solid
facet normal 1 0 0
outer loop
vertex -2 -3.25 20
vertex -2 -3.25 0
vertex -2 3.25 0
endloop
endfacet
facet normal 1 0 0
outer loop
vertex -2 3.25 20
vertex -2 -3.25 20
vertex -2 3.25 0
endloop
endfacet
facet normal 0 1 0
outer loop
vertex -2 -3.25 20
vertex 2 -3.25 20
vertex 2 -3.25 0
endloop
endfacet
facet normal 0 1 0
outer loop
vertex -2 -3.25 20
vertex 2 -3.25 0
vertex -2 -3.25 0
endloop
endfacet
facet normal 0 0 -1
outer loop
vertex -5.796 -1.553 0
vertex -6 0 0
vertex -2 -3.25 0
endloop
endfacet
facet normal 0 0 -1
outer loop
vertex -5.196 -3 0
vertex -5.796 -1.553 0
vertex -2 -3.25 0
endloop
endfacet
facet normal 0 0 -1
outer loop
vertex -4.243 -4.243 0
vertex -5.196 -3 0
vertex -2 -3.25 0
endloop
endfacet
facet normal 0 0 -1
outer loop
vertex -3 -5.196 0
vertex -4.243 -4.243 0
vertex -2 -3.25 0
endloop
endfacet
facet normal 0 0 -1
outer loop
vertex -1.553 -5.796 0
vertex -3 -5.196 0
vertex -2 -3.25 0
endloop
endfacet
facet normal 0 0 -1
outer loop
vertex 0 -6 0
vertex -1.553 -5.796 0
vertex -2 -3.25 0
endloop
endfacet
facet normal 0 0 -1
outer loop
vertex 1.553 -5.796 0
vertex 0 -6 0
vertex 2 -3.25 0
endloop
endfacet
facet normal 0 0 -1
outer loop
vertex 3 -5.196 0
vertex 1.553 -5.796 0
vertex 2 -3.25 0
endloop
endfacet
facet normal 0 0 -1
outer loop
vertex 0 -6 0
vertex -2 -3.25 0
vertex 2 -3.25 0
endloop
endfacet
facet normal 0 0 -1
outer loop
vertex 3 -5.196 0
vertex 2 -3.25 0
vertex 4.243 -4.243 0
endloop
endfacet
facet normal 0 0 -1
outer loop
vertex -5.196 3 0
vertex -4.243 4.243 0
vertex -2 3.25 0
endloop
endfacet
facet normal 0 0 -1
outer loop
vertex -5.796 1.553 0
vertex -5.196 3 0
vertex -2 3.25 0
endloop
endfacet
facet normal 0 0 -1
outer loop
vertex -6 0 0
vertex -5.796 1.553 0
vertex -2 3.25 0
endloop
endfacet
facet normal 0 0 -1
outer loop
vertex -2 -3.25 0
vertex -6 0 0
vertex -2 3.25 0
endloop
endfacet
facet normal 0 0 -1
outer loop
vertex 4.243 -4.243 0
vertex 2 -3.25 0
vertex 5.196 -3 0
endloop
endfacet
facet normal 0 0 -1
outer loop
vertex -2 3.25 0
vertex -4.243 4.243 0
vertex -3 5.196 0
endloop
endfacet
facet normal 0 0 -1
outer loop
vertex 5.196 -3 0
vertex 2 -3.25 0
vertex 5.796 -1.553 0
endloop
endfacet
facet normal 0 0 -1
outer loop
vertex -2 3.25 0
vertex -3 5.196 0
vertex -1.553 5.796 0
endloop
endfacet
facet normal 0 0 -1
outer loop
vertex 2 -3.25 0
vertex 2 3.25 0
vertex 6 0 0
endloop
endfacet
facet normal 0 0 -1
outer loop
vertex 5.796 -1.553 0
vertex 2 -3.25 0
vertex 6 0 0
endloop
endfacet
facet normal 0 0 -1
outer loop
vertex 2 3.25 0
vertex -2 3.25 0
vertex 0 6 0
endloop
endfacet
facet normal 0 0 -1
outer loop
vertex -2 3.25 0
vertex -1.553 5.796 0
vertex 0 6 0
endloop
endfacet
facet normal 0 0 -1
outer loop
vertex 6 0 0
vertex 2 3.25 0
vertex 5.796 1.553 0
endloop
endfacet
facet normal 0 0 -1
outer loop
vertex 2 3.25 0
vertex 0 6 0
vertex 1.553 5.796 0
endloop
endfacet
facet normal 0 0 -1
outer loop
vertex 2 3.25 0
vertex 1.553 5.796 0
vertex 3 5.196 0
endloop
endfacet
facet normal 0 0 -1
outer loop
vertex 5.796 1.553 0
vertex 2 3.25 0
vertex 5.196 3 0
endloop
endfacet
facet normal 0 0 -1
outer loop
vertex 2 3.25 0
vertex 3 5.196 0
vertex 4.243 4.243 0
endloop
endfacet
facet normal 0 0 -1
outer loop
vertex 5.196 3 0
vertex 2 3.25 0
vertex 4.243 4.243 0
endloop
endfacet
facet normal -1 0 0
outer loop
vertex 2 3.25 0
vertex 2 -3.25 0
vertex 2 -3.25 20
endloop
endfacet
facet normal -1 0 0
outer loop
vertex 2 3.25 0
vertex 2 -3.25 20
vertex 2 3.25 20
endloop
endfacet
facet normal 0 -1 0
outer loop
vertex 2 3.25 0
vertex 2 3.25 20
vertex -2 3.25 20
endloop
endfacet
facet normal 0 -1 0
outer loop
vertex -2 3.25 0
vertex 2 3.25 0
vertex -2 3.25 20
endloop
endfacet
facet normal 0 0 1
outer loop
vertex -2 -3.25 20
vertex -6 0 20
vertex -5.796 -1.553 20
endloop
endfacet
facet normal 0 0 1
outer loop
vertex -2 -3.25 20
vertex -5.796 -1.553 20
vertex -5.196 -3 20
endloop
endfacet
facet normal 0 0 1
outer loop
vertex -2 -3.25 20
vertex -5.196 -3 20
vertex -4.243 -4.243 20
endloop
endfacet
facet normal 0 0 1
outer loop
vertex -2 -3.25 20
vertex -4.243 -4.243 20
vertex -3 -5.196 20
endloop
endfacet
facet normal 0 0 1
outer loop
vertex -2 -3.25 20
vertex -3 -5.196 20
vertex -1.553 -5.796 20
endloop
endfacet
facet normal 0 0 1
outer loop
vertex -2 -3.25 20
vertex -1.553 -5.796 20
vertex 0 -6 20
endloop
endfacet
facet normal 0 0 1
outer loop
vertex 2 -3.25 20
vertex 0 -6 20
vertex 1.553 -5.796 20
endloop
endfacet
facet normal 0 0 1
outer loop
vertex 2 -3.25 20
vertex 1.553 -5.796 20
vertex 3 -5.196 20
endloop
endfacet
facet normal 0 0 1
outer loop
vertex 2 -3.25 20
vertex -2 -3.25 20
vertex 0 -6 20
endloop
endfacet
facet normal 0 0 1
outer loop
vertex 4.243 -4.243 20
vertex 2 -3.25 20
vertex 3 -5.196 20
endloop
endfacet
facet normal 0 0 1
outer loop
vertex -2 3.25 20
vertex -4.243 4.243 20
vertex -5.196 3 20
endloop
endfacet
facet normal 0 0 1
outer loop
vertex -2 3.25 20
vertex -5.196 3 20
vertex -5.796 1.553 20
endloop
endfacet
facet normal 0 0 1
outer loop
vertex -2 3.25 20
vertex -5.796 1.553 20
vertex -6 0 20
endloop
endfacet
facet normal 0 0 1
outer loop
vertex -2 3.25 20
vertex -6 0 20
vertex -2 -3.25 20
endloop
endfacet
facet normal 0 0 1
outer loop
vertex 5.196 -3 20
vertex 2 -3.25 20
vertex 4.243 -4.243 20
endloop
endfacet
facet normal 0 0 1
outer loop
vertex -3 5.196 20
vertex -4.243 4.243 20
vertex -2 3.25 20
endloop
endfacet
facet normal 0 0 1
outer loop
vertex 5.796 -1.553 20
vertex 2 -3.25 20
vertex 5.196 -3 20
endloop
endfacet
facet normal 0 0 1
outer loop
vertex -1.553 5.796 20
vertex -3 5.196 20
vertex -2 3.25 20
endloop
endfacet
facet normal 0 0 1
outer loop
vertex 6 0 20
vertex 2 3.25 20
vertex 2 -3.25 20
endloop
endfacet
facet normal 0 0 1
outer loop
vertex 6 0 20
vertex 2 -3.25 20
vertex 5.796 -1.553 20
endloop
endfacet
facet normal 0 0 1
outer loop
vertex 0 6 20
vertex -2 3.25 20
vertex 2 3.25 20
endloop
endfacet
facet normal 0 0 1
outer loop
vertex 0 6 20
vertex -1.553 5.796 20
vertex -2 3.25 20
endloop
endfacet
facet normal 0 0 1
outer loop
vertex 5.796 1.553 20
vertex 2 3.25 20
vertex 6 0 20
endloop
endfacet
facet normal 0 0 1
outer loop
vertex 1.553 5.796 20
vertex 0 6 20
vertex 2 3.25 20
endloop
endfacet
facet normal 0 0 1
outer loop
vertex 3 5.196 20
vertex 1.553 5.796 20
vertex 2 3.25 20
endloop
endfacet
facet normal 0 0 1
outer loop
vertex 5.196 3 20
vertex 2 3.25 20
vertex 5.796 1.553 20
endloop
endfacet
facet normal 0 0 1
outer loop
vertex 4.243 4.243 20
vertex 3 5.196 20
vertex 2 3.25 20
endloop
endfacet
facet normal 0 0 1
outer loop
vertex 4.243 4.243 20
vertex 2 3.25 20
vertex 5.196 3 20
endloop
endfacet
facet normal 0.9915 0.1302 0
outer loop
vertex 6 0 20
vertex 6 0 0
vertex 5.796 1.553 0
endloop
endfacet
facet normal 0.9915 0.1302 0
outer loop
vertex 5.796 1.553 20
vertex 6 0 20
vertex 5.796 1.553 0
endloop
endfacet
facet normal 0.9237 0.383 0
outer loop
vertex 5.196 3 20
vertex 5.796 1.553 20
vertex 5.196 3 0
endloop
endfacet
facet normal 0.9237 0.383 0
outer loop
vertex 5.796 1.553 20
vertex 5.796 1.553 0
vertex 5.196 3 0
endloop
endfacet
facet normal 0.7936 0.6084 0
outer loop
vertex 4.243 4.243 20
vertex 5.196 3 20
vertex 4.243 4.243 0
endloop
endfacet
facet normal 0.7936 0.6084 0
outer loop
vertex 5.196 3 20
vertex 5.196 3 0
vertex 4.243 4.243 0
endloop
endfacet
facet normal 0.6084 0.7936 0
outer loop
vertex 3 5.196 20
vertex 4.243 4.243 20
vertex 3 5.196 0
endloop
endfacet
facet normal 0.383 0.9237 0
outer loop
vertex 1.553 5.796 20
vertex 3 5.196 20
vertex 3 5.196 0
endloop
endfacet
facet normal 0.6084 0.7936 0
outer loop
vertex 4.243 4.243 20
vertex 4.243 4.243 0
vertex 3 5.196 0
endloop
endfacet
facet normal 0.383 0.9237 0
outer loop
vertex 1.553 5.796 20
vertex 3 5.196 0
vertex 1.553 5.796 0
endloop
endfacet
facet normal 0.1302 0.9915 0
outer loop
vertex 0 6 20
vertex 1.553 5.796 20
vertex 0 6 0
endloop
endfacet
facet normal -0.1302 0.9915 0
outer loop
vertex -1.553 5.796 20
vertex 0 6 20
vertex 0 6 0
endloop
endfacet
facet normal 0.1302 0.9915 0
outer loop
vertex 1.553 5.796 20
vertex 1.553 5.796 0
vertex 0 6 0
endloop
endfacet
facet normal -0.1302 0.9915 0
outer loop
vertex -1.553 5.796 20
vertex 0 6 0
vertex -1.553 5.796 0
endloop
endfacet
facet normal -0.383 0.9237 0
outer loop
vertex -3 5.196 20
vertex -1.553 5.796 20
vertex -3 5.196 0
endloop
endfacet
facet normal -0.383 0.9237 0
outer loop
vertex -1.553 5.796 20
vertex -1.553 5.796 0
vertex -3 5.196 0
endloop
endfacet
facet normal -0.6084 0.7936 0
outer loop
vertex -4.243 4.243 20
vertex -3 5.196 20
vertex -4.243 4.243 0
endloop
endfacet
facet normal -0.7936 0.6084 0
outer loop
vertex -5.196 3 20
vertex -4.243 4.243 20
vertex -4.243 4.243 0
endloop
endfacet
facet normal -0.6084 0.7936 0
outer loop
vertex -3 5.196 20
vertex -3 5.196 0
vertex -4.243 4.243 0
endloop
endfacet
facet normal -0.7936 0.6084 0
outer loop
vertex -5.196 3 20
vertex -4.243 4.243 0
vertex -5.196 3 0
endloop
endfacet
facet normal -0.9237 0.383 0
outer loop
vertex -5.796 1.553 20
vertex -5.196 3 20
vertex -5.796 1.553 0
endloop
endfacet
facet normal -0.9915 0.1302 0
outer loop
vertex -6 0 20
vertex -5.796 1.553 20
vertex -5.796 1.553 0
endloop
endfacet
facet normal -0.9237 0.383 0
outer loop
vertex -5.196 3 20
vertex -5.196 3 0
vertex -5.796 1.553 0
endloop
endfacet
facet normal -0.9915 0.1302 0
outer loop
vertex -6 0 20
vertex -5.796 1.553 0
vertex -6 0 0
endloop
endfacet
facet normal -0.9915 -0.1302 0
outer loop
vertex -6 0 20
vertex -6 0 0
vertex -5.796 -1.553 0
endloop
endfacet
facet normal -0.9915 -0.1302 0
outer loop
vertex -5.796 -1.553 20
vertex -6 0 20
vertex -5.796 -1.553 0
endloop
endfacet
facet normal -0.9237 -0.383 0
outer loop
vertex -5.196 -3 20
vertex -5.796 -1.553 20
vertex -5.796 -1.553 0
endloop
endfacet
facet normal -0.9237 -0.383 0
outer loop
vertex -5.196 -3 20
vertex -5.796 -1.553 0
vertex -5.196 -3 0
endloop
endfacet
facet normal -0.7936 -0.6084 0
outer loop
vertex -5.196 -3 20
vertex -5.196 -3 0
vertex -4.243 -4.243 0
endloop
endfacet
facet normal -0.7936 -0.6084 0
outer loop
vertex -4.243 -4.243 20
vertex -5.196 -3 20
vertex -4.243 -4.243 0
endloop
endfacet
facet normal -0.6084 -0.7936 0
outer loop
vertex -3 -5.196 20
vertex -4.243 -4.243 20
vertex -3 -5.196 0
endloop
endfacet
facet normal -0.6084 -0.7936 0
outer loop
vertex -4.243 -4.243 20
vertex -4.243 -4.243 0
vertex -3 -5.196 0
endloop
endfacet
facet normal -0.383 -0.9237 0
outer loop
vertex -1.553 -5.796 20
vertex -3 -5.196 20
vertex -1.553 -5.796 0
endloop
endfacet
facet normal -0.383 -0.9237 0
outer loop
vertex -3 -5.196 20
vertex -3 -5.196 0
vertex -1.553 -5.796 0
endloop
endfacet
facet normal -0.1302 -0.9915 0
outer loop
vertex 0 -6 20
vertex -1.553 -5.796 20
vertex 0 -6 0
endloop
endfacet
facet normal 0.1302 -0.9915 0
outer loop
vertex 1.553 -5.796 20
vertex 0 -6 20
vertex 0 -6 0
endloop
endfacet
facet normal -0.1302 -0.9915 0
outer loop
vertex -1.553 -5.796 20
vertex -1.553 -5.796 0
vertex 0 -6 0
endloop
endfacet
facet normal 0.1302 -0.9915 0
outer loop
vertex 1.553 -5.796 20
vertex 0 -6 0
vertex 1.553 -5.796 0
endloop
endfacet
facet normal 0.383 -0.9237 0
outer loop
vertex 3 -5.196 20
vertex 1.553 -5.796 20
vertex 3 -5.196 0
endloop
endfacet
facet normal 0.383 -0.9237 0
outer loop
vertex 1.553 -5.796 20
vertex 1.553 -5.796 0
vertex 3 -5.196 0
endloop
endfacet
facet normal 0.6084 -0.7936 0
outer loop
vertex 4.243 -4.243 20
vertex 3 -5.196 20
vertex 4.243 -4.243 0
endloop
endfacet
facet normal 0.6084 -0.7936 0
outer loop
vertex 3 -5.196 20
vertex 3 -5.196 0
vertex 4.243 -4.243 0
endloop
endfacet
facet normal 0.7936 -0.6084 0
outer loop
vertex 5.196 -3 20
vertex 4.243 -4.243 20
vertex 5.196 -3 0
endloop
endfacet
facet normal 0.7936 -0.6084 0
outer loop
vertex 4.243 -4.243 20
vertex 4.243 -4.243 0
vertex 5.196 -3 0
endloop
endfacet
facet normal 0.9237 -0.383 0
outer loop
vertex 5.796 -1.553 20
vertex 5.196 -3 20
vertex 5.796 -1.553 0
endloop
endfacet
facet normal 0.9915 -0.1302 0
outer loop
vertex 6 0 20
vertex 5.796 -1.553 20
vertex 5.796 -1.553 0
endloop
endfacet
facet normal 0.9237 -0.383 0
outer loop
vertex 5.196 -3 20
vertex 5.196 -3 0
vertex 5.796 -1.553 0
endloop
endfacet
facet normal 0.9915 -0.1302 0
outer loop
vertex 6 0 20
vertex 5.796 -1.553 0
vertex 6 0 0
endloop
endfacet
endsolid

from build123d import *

# Parameters (mm, degrees)
ESQUISSE1_R      = 6
EXTRUSION1_DEPTH = 20
ESQUISSE2_W      = 4
ESQUISSE2_H      = 6.5
EXTRUSION2_DEPTH = 20


with BuildPart() as part:
    # Esquisse1 → Extrusion1 (new body)
    with BuildSketch(Plane.XY):
        Circle(ESQUISSE1_R)
    extrude(amount=EXTRUSION1_DEPTH)

    # Esquisse2 → Extrusion2 (cut)
    with BuildSketch(Plane(origin=(0, 0, 0), x_dir=(-1, 0, 0), z_dir=(0, 0, -1))):
        Rectangle(ESQUISSE2_W, ESQUISSE2_H)
    extrude(amount=-EXTRUSION2_DEPTH, mode=Mode.SUBTRACT)


solid = part.part
